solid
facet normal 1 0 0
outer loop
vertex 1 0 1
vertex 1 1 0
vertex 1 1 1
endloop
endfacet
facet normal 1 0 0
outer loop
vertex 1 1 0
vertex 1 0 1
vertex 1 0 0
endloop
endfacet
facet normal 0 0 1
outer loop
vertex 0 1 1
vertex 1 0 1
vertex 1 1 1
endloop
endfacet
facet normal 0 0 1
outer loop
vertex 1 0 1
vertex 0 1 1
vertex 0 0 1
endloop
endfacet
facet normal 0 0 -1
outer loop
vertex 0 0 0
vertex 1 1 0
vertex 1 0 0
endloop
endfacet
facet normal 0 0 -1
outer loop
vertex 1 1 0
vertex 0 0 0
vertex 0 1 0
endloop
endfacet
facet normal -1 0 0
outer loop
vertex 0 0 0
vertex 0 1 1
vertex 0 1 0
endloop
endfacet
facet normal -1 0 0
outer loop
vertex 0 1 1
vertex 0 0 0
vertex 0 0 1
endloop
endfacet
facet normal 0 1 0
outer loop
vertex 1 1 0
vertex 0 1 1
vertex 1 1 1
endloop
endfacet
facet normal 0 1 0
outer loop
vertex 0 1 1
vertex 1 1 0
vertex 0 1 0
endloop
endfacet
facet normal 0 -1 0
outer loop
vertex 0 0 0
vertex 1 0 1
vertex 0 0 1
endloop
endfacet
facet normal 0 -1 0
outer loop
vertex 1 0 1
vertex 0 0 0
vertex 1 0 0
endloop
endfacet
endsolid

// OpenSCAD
rows = 5;
columns = 5;

design = [
    [1, 1, 1, 1, 1],
    [1, 0, 0, 0, 1],
    [1, 0, 3, 0, 1],
    [1, 0, 0, 0, 1],
    [1, 1, 1, 1, 1]
];

wall_thickness = 2;
outer_wall_thickness = 2;
bottom_thickness = 2;



total_width = 100;
total_height = 100;
total_depth = 10;

intersection() {
    cube(size = [total_width, total_height, total_depth]);

    for(row = [0 : rows - 1]) {
        for(column = [0 : columns - 1]) {
            cube();
        }
    }
}
